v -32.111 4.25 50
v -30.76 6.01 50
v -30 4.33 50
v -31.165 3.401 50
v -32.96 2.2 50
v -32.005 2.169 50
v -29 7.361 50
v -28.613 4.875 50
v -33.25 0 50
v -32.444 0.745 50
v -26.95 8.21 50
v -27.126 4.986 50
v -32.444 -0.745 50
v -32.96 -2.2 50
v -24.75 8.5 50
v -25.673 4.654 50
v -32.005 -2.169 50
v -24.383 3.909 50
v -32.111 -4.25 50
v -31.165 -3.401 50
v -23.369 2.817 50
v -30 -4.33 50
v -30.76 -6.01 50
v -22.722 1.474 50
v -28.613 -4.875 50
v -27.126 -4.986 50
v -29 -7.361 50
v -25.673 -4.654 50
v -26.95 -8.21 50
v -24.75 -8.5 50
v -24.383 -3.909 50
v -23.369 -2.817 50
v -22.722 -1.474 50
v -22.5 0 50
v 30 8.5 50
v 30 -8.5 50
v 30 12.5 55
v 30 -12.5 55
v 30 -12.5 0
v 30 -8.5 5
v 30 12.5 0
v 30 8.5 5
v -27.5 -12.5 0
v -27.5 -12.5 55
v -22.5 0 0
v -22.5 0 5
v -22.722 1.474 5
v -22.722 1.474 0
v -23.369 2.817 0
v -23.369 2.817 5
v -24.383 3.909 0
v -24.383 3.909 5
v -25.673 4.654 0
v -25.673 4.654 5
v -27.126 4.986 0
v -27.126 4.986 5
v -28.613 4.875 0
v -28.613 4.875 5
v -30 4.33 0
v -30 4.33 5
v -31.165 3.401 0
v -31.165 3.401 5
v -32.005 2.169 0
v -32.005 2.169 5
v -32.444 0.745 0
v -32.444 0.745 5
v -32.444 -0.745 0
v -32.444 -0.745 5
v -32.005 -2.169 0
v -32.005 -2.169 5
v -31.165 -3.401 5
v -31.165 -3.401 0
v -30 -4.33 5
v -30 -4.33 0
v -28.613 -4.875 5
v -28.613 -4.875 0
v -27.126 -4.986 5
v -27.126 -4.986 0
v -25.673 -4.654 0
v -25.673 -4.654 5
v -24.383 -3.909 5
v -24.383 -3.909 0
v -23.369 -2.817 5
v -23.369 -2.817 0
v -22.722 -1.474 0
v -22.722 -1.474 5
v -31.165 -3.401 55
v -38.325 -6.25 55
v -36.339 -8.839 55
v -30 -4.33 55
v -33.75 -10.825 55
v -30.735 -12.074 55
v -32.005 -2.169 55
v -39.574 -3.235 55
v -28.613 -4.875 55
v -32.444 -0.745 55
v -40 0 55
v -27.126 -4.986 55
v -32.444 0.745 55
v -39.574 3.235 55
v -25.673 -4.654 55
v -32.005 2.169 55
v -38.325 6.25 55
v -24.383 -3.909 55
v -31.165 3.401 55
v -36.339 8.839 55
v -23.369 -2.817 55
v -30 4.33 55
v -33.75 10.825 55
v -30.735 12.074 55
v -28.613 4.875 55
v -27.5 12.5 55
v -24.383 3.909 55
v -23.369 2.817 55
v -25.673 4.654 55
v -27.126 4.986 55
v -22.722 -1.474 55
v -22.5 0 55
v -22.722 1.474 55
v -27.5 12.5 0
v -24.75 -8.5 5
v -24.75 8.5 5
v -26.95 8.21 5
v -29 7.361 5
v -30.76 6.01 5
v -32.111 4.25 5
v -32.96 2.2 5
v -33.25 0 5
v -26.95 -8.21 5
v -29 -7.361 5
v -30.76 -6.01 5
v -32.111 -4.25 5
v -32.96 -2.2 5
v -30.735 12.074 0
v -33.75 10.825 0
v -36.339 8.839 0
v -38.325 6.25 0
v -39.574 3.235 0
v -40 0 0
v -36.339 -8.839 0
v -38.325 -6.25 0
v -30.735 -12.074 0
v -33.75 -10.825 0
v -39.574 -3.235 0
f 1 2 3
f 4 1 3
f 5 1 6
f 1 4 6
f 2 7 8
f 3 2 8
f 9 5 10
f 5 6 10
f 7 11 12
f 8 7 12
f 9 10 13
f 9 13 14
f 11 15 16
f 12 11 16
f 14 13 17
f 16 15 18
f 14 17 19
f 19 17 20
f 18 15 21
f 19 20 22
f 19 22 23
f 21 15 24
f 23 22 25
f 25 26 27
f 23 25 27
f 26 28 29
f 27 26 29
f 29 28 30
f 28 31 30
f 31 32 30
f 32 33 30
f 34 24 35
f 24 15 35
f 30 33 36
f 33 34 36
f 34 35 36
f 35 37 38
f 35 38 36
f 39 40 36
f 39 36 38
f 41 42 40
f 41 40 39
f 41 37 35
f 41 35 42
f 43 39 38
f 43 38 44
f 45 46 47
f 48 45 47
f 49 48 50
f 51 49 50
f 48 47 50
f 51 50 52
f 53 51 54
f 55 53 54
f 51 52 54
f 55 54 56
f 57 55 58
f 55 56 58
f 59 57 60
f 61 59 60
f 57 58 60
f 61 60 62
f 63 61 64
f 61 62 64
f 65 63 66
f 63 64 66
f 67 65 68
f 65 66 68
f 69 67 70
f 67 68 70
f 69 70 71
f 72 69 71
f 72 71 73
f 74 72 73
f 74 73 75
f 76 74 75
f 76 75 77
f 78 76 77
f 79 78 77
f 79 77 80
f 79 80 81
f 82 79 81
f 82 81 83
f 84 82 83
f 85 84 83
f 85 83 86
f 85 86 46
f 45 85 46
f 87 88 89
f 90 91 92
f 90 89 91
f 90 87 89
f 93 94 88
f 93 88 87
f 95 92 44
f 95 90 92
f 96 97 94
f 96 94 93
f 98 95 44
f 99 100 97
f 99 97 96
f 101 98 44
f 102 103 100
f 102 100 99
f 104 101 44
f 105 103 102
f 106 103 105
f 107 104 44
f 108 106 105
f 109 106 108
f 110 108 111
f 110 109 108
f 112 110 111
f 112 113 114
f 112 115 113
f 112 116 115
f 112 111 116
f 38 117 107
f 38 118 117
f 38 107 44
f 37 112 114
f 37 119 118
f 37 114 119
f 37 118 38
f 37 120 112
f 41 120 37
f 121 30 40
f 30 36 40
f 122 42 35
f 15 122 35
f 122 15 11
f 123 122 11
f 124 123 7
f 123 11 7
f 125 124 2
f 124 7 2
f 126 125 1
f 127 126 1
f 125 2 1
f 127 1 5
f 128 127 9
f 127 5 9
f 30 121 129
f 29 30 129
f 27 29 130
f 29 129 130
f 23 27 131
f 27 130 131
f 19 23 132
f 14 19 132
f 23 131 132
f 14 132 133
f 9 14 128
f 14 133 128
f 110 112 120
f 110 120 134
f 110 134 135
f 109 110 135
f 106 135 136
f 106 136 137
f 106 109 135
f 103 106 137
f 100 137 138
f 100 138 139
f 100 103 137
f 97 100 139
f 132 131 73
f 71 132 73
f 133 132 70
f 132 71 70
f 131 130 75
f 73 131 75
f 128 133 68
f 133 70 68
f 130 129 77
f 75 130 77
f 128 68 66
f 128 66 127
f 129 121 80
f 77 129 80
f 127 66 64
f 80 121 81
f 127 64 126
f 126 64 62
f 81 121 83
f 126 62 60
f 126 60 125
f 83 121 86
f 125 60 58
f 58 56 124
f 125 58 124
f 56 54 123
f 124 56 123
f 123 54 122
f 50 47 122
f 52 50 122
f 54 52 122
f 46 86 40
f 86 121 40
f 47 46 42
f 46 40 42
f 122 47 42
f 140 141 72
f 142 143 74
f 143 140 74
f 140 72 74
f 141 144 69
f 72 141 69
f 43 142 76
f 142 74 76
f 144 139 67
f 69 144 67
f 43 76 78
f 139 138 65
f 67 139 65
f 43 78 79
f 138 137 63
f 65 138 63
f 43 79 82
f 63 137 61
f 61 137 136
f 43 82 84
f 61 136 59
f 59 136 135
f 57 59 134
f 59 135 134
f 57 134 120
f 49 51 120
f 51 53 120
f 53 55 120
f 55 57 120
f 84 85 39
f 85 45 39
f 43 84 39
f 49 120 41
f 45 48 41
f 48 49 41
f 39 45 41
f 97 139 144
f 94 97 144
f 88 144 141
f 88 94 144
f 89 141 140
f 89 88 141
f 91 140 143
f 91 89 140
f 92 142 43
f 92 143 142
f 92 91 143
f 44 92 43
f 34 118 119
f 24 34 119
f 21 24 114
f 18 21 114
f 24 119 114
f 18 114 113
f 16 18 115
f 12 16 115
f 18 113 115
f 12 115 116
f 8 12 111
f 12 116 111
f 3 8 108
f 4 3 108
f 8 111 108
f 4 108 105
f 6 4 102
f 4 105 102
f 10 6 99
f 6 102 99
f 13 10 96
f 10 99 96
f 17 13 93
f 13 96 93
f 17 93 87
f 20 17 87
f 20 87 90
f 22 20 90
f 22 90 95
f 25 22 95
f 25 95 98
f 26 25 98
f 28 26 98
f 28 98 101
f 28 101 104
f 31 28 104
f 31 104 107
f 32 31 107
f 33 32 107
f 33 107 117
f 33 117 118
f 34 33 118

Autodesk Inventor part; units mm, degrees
ref_plane "YZ Plane" through (0, 0, 0) normal (1, 0, 0) x (0, 1, 0)
ref_plane "XZ Plane" through (0, 0, 0) normal (0, 1, 0) x (-1, 0, 0)
ref_plane "XY Plane" through (0, 0, 0) normal (0, 0, 1) x (1, 0, 0)
sketch "Sketch1" plane through (0, 0, 0) normal (0, 0, 1) x (1, 0, 0)
  line L0 (-40, 12.5) -> (40, 12.5)
  line L1 (40, 12.5) -> (40, -12.5)
  line L2 (40, -12.5) -> (-40, -12.5)
  line L3 (-40, -12.5) -> (-40, 12.5)
  line L4 (-40, 12.5) -> (40, -12.5) construction
  line L5 (40, 12.5) -> (-40, -12.5) construction
  point P0 (0, 0)
  dimension "d0" = 80
  dimension "d1" = 25
extrude "Extrusion1" add sketch "Sketch1" along normal blind 55
sketch "Sketch2" plane through (0, 0, 55) normal (0, 0, 1) x (1, 0, 0)
  circle A0 centre (-27.5, 0) radius 5
  line L0 (-40, 12.5) -> (-40, -12.5) projected
  point P0 (0, 0)
  dimension "d4" = 10
  dimension "d5" = 12.5
extrude "Extrusion2" cut sketch "Sketch2" against normal through all
sketch "Sketch3" plane through (40, -12.5, 0) normal (1, 0, 0) x (0, 0, -1)
  line L0 (-50, 4) -> (-5, 4)
  line L1 (-5, 4) -> (-5, 21)
  line L2 (-5, 21) -> (-50, 21)
  line L3 (-50, 21) -> (-50, 4)
  line L4 (-50, 4) -> (-5, 21) construction
  line L5 (-5, 4) -> (-50, 21) construction
  line L6 (-55, 0) -> (-55, 25) projected
  line L7 (0, 25) -> (-55, 25) projected
  point P0 (0, 12.5)
  point P1 (-27.5, 12.5)
  dimension "d8" = 45
  dimension "d9" = 17
  dimension "d10" = 27.5
  dimension "d11" = 12.5
extrude "Extrusion3" cut sketch "Sketch3" against normal blind 73.25
full round fillet "Full Round Fillet1" first side at (15.5833, 8.5, 20) centre faces at (-33.25, -2.8333, 20) second side at (15.5833, -8.5, 35)
fillet "Fillet1" radius 12.5 2 edges at (-40, 12.5, 27.5) (-40, -12.5, 27.5)
sketch "Sketch4" plane through (40, -12.5, 0) normal (1, 0, 0) x (0, 0, -1)
  line L0 (-55, 0) -> (-55, 25) projected
  line L1 (0, 0) -> (-55, 0) projected
  line L2 (-55, 25) -> (0, 25)
  line L3 (0, 25) -> (0, 0)
  line L4 (0, 0) -> (-55, 0)
  line L5 (-55, 0) -> (-55, 25)
  point P0 (0, 12.5)
extrude "Extrusion4" cut sketch "Sketch4" against normal blind 10
properties part number "2nd arm"
